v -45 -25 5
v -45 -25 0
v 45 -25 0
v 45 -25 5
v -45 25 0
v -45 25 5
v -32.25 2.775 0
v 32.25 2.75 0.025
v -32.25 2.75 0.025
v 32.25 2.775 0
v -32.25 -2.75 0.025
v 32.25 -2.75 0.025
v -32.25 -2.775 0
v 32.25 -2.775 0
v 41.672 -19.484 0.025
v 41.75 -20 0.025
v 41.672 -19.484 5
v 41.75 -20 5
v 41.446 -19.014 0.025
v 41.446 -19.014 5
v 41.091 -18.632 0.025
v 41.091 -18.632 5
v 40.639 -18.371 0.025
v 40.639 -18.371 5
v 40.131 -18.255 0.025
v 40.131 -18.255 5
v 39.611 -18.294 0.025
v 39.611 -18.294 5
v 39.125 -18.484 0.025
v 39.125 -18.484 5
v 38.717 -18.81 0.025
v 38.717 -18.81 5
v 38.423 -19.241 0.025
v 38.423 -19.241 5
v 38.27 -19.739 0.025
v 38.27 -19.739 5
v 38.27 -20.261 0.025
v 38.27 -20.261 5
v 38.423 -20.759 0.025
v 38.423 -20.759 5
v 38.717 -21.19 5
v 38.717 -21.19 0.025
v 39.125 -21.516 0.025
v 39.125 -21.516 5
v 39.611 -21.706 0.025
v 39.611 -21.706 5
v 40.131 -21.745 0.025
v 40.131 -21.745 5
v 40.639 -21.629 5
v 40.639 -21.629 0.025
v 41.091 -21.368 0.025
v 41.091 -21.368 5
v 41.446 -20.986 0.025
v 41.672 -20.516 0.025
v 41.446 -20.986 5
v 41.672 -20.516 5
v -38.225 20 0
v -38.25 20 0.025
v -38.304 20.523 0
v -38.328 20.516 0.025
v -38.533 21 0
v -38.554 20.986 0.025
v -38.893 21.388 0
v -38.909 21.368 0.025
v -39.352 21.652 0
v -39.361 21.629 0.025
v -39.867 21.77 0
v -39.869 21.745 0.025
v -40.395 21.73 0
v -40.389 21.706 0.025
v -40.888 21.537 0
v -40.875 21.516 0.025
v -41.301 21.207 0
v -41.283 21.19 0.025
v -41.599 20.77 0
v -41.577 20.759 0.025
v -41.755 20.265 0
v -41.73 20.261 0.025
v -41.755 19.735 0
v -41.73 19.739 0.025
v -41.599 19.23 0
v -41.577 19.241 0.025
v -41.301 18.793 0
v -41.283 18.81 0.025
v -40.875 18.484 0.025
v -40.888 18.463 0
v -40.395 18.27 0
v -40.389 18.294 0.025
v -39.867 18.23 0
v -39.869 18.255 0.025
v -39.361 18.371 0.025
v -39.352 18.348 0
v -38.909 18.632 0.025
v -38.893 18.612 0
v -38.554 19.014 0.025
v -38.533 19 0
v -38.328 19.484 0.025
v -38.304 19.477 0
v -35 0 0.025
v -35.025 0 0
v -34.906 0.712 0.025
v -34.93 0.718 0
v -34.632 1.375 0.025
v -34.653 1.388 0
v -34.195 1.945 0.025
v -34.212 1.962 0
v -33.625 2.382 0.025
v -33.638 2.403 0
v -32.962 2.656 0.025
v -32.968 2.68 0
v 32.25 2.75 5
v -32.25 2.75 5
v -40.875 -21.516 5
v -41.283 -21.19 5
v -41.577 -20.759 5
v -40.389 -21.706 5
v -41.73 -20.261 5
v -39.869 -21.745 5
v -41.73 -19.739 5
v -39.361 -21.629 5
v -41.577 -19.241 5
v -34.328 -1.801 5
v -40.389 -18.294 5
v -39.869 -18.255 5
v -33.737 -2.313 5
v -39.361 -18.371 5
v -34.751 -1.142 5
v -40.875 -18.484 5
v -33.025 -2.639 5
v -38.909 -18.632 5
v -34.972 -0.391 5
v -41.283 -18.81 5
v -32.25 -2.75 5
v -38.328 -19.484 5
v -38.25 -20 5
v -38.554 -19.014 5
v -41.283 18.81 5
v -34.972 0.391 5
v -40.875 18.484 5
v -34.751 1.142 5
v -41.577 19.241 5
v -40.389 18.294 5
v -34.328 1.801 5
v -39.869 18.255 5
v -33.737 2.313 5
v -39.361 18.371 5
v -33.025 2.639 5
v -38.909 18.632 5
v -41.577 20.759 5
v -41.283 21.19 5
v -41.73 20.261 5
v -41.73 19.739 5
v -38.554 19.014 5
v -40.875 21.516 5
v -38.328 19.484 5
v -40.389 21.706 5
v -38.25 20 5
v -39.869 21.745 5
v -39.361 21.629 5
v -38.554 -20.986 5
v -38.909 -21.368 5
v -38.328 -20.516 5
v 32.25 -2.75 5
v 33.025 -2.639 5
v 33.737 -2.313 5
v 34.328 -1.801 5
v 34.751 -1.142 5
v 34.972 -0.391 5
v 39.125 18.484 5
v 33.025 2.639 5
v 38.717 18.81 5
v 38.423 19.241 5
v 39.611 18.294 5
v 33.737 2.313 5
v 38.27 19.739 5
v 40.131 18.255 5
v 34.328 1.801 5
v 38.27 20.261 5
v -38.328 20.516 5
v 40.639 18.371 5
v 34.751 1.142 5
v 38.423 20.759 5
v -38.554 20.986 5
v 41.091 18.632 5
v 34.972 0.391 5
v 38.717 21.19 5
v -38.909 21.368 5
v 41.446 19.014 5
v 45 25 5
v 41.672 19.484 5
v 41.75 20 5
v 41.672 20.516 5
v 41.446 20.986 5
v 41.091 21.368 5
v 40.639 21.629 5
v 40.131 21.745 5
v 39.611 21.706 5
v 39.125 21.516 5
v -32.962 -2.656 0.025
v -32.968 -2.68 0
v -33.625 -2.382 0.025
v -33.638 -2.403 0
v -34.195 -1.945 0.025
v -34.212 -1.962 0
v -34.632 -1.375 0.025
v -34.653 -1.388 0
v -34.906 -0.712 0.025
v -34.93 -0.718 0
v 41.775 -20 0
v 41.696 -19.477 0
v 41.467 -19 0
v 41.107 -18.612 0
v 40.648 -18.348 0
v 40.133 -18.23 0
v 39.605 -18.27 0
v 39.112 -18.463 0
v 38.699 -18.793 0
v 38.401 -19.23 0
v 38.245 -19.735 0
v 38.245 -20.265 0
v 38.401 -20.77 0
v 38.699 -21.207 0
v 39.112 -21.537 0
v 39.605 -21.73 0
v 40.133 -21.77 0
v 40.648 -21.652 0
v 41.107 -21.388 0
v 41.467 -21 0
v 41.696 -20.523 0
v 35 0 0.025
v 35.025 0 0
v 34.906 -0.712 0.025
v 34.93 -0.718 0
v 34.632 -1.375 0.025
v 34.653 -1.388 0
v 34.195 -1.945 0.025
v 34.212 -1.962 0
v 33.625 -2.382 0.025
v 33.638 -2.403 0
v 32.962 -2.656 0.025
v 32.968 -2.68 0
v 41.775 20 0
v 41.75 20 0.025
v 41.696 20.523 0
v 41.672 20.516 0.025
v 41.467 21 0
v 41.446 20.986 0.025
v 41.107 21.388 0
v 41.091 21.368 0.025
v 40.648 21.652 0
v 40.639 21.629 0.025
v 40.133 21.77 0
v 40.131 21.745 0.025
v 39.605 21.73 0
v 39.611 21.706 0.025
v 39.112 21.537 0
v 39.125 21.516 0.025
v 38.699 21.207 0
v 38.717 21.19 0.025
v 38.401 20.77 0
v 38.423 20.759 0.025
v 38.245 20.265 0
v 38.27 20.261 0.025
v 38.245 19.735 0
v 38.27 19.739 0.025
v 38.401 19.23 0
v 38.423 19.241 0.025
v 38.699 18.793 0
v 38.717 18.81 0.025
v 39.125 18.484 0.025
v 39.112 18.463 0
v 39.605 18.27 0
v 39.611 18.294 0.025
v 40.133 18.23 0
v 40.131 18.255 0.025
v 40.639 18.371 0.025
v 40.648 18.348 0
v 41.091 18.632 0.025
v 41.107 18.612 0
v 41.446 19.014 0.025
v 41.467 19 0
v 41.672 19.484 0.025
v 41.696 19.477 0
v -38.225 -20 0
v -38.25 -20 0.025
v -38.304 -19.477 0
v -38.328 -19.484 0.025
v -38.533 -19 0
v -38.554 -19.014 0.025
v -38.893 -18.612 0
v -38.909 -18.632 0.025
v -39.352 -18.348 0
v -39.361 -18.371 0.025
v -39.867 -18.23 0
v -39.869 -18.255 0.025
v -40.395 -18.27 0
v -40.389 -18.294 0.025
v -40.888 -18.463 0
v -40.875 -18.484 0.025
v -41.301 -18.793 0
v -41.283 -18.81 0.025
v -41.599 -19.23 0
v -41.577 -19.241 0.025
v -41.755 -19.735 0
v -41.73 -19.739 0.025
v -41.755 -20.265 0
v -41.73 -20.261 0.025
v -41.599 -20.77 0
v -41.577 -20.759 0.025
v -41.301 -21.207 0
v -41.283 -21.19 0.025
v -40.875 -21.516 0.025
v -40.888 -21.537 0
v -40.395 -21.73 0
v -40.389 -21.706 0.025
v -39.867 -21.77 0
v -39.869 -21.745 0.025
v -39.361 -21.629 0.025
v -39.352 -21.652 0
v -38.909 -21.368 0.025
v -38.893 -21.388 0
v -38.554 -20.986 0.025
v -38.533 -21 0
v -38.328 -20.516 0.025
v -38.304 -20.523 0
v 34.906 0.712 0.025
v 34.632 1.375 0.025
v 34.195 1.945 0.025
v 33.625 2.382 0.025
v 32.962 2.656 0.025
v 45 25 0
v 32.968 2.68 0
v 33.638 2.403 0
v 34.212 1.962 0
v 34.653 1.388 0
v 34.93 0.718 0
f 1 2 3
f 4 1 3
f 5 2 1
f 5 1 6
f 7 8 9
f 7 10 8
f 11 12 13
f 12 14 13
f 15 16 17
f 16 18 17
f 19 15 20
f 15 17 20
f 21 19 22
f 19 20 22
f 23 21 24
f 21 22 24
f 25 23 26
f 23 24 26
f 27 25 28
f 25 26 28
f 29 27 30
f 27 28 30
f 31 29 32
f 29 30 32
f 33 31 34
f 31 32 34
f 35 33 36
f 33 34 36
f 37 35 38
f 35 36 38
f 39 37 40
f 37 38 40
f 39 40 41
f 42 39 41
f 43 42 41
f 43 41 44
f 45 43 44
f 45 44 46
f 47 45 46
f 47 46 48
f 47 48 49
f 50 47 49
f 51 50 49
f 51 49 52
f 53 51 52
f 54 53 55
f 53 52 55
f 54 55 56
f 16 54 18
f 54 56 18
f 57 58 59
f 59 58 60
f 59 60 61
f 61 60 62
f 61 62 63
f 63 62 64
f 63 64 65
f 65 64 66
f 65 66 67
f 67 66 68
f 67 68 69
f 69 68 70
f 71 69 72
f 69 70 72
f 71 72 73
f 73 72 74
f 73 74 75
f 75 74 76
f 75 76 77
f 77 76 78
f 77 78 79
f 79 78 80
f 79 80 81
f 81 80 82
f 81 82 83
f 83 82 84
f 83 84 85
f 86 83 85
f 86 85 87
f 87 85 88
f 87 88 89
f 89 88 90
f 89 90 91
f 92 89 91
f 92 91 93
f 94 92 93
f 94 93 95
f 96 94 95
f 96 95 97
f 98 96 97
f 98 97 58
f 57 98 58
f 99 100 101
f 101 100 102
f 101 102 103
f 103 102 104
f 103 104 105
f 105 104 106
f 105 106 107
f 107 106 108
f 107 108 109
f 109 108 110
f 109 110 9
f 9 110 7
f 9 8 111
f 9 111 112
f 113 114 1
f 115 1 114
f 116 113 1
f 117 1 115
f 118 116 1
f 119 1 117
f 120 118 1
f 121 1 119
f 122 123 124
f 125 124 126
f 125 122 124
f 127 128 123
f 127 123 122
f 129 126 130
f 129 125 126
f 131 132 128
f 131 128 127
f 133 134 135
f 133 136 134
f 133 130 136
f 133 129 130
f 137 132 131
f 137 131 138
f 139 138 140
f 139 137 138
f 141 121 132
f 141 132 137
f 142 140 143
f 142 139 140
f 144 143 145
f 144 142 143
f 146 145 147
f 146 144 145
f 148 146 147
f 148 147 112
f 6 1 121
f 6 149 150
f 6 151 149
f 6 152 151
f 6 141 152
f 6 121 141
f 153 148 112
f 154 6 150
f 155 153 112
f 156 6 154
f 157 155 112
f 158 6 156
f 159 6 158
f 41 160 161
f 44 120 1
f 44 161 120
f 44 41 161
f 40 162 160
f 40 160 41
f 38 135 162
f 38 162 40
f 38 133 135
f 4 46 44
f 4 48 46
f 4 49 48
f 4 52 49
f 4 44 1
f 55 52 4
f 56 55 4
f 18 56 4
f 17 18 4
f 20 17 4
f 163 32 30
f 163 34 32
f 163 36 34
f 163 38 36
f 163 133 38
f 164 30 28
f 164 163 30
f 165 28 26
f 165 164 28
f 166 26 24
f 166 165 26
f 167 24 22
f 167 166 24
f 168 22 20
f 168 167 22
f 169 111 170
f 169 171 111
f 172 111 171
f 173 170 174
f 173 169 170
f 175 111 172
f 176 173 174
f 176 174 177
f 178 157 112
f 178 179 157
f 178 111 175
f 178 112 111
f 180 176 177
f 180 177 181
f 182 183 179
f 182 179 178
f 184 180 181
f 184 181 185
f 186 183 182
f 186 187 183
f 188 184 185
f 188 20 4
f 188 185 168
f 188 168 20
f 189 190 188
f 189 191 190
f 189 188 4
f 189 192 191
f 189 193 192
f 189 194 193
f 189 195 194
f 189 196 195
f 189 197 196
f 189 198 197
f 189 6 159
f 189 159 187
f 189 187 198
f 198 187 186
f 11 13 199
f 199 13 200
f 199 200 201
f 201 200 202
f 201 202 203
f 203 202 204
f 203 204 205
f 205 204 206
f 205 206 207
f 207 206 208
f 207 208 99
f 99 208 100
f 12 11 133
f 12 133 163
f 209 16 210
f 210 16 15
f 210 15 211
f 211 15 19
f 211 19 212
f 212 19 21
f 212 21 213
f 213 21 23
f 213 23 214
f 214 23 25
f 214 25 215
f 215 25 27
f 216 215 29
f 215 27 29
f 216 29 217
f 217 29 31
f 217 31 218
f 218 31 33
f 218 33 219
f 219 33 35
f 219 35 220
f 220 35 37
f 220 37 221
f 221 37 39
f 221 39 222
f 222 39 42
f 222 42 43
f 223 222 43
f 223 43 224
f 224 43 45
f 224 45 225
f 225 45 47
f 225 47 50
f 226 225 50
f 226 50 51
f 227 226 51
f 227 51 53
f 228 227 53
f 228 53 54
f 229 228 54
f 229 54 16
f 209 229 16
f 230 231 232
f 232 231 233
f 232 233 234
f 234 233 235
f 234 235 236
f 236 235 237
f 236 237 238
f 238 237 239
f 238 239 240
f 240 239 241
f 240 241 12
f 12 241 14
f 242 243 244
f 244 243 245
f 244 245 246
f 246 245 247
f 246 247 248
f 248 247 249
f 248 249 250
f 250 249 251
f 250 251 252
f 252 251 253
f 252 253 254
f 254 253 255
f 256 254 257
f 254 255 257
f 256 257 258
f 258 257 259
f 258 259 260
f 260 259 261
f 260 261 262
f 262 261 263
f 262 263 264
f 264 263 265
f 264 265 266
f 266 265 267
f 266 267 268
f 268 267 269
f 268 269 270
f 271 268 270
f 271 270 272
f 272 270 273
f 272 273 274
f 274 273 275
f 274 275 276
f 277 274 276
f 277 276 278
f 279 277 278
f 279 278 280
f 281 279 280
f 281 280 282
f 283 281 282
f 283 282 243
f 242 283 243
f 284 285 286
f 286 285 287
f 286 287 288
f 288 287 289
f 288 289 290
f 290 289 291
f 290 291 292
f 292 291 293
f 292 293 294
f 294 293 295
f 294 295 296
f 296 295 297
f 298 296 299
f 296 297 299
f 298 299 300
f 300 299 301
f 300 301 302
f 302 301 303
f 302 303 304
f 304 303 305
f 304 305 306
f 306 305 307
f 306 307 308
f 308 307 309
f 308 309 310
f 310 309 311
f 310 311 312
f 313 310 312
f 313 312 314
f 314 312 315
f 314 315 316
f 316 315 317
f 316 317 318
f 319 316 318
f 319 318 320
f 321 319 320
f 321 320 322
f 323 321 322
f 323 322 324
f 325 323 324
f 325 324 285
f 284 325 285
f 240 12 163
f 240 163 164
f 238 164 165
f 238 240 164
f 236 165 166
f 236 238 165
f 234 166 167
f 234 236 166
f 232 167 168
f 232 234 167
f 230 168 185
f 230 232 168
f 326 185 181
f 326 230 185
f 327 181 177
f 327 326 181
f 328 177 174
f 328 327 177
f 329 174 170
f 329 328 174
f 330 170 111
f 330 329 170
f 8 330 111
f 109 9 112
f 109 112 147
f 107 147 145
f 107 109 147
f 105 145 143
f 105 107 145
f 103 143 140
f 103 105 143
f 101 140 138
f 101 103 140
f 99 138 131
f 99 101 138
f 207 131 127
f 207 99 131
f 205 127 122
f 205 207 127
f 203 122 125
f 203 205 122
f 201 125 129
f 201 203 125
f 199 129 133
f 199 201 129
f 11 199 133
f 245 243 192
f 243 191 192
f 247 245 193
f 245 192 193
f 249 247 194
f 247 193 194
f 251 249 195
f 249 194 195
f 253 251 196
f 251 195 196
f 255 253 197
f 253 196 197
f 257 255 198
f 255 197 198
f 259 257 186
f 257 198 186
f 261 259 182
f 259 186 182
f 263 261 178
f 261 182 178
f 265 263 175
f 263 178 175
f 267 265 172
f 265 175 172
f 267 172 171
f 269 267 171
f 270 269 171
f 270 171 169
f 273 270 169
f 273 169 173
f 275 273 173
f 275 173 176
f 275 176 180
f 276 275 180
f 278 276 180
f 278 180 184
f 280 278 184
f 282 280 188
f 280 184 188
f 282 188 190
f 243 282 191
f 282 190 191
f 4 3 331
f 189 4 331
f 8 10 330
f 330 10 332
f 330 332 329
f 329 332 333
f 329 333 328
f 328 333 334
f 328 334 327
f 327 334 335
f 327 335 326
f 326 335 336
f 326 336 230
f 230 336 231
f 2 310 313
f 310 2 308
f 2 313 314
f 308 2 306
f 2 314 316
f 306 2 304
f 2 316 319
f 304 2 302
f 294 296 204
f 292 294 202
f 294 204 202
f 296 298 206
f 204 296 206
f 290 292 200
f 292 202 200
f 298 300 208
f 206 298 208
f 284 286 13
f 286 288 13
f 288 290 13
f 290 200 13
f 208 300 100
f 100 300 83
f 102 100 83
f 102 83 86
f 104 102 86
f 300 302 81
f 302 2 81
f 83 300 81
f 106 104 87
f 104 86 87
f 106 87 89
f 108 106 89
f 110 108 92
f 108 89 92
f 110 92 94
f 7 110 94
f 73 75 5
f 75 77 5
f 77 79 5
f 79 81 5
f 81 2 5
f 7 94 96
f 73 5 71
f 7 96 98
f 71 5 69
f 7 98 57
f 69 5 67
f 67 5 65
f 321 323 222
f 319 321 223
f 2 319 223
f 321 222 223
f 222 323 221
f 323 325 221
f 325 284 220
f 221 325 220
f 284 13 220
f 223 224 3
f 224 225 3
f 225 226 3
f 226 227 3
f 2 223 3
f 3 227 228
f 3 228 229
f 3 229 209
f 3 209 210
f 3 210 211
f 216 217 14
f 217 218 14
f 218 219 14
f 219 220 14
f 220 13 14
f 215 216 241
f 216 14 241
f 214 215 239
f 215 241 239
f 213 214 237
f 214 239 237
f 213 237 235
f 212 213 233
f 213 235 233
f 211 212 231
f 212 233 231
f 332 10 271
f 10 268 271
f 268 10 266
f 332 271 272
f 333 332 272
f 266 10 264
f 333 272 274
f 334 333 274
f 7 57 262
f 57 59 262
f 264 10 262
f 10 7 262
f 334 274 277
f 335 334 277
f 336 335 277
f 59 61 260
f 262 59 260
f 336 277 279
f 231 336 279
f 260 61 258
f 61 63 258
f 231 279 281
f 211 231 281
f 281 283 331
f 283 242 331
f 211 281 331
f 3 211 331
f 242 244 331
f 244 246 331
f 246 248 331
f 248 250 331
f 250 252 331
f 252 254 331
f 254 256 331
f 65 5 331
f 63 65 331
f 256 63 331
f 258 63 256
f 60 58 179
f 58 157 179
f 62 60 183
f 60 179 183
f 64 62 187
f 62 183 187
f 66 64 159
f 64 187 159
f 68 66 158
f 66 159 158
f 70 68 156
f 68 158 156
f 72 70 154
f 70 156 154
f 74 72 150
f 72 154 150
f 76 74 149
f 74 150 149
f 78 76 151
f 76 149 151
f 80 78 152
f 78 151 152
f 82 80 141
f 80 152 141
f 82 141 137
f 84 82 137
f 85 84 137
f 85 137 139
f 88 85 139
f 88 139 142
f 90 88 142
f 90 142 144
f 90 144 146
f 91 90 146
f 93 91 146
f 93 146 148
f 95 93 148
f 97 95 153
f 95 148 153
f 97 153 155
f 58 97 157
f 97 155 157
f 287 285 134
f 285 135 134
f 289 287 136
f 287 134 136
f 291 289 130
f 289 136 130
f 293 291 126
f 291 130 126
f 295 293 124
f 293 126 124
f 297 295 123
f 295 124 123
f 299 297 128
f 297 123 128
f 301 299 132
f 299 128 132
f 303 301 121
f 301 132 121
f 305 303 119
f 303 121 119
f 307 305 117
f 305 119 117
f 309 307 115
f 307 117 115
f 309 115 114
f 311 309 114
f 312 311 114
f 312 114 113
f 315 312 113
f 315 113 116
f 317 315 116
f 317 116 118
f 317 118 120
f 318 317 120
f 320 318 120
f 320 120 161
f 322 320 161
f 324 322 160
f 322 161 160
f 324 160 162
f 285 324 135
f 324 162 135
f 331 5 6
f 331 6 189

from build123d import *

# Parameters (mm, degrees)
SKETCH1_W                            = 90
SKETCH1_H                            = 50
BOSS_EXTRUDE1_DEPTH                  = 5
F_5_5_5_5_DIAMETER_SLOT1_DEPTH       = 5
F_3_5_3_5_DIAMETER_HOLE1_D           = 3.5
F_3_5_3_5_DIAMETER_HOLE1_CSINK_D     = 3.55
F_3_5_3_5_DIAMETER_HOLE1_CSINK_ANGLE = 90


with BuildPart() as part:
    # Sketch1 → Boss-Extrude1 (new body)
    with BuildSketch(Plane.XY):
        Rectangle(SKETCH1_W, SKETCH1_H)
    extrude(amount=BOSS_EXTRUDE1_DEPTH)

    # Ø5.5 (5.5) Diameter Slot1: read off the stored shape, not the designer's step
    # Ø5.5 (5.5) Diameter Slot1 outline → Ø5.5 (5.5) Diameter Slot1 (cut)
    with BuildSketch(Plane.XY):
        with BuildLine():
            ThreePointArc((32.25, -2.75), (35, 0), (32.25, 2.75))
            Line((32.25, 2.75), (-32.25, 2.75))
            ThreePointArc((-32.25, 2.75), (-35, 0), (-32.25, -2.75))
            Line((-32.25, -2.75), (32.25, -2.75))
        make_face()
    extrude(amount=F_5_5_5_5_DIAMETER_SLOT1_DEPTH, mode=Mode.SUBTRACT)

    # 5.5 _5.5_ Diameter Slot1 2: loft between two sections, ruled curve by curve
    f_5_5_5_5_diameter_slot1_2_from = [
        Edge.make_three_point_arc((32.25, 2.75, 0.025), (34.194543648, 1.944543648, 0.025), (35, 0, 0.025)),
        Edge.make_three_point_arc((35, 0, 0.025), (34.194543648, -1.944543648, 0.025), (32.25, -2.75, 0.025)),
        Edge.make_three_point_arc((-32.25, -2.75, 0.025), (-34.194543648, -1.944543648, 0.025), (-35, 0, 0.025)),
        Edge.make_three_point_arc((-35, 0, 0.025), (-34.194543648, 1.944543648, 0.025), (-32.25, 2.75, 0.025)),
        Edge.make_line((32.25, -2.75, 0.025), (-32.25, -2.75, 0.025)),
        Edge.make_line((32.25, 2.75, 0.025), (-32.25, 2.75, 0.025)),
    ]
    f_5_5_5_5_diameter_slot1_2_to = [
        Edge.make_three_point_arc((32.25, 2.775, 0), (34.212221318, 1.962221318, 0), (35.025, 0, 0)),
        Edge.make_three_point_arc((35.025, 0, 0), (34.212221318, -1.962221318, 0), (32.25, -2.775, 0)),
        Edge.make_three_point_arc((-32.25, -2.775, 0), (-34.212221318, -1.962221318, 0), (-35.025, 0, 0)),
        Edge.make_three_point_arc((-35.025, 0, 0), (-34.212221318, 1.962221318, 0), (-32.25, 2.775, 0)),
        Edge.make_line((32.25, -2.775, 0), (-32.25, -2.775, 0)),
        Edge.make_line((32.25, 2.775, 0), (-32.25, 2.775, 0)),
    ]
    f_5_5_5_5_diameter_slot1_2 = Solid(Shell([*[Face.make_surface_from_curves(f_5_5_5_5_diameter_slot1_2_from[k], f_5_5_5_5_diameter_slot1_2_to[k]) for k in range(6)], Face(Wire(f_5_5_5_5_diameter_slot1_2_from)), Face(Wire(f_5_5_5_5_diameter_slot1_2_to))]))
    add(f_5_5_5_5_diameter_slot1_2, mode=Mode.SUBTRACT)

    # Ø3.5 (3.5) Diameter Hole1 (through all)
    with Locations(Plane(origin=(0, 0, 0), x_dir=(-1, 0, 0), z_dir=(0, 0, -1))):
        with Locations((-40, 20), (40, 20), (40, -20), (-40, -20)):
            CounterSinkHole(F_3_5_3_5_DIAMETER_HOLE1_D / 2, F_3_5_3_5_DIAMETER_HOLE1_CSINK_D / 2, counter_sink_angle=F_3_5_3_5_DIAMETER_HOLE1_CSINK_ANGLE)


solid = part.part
